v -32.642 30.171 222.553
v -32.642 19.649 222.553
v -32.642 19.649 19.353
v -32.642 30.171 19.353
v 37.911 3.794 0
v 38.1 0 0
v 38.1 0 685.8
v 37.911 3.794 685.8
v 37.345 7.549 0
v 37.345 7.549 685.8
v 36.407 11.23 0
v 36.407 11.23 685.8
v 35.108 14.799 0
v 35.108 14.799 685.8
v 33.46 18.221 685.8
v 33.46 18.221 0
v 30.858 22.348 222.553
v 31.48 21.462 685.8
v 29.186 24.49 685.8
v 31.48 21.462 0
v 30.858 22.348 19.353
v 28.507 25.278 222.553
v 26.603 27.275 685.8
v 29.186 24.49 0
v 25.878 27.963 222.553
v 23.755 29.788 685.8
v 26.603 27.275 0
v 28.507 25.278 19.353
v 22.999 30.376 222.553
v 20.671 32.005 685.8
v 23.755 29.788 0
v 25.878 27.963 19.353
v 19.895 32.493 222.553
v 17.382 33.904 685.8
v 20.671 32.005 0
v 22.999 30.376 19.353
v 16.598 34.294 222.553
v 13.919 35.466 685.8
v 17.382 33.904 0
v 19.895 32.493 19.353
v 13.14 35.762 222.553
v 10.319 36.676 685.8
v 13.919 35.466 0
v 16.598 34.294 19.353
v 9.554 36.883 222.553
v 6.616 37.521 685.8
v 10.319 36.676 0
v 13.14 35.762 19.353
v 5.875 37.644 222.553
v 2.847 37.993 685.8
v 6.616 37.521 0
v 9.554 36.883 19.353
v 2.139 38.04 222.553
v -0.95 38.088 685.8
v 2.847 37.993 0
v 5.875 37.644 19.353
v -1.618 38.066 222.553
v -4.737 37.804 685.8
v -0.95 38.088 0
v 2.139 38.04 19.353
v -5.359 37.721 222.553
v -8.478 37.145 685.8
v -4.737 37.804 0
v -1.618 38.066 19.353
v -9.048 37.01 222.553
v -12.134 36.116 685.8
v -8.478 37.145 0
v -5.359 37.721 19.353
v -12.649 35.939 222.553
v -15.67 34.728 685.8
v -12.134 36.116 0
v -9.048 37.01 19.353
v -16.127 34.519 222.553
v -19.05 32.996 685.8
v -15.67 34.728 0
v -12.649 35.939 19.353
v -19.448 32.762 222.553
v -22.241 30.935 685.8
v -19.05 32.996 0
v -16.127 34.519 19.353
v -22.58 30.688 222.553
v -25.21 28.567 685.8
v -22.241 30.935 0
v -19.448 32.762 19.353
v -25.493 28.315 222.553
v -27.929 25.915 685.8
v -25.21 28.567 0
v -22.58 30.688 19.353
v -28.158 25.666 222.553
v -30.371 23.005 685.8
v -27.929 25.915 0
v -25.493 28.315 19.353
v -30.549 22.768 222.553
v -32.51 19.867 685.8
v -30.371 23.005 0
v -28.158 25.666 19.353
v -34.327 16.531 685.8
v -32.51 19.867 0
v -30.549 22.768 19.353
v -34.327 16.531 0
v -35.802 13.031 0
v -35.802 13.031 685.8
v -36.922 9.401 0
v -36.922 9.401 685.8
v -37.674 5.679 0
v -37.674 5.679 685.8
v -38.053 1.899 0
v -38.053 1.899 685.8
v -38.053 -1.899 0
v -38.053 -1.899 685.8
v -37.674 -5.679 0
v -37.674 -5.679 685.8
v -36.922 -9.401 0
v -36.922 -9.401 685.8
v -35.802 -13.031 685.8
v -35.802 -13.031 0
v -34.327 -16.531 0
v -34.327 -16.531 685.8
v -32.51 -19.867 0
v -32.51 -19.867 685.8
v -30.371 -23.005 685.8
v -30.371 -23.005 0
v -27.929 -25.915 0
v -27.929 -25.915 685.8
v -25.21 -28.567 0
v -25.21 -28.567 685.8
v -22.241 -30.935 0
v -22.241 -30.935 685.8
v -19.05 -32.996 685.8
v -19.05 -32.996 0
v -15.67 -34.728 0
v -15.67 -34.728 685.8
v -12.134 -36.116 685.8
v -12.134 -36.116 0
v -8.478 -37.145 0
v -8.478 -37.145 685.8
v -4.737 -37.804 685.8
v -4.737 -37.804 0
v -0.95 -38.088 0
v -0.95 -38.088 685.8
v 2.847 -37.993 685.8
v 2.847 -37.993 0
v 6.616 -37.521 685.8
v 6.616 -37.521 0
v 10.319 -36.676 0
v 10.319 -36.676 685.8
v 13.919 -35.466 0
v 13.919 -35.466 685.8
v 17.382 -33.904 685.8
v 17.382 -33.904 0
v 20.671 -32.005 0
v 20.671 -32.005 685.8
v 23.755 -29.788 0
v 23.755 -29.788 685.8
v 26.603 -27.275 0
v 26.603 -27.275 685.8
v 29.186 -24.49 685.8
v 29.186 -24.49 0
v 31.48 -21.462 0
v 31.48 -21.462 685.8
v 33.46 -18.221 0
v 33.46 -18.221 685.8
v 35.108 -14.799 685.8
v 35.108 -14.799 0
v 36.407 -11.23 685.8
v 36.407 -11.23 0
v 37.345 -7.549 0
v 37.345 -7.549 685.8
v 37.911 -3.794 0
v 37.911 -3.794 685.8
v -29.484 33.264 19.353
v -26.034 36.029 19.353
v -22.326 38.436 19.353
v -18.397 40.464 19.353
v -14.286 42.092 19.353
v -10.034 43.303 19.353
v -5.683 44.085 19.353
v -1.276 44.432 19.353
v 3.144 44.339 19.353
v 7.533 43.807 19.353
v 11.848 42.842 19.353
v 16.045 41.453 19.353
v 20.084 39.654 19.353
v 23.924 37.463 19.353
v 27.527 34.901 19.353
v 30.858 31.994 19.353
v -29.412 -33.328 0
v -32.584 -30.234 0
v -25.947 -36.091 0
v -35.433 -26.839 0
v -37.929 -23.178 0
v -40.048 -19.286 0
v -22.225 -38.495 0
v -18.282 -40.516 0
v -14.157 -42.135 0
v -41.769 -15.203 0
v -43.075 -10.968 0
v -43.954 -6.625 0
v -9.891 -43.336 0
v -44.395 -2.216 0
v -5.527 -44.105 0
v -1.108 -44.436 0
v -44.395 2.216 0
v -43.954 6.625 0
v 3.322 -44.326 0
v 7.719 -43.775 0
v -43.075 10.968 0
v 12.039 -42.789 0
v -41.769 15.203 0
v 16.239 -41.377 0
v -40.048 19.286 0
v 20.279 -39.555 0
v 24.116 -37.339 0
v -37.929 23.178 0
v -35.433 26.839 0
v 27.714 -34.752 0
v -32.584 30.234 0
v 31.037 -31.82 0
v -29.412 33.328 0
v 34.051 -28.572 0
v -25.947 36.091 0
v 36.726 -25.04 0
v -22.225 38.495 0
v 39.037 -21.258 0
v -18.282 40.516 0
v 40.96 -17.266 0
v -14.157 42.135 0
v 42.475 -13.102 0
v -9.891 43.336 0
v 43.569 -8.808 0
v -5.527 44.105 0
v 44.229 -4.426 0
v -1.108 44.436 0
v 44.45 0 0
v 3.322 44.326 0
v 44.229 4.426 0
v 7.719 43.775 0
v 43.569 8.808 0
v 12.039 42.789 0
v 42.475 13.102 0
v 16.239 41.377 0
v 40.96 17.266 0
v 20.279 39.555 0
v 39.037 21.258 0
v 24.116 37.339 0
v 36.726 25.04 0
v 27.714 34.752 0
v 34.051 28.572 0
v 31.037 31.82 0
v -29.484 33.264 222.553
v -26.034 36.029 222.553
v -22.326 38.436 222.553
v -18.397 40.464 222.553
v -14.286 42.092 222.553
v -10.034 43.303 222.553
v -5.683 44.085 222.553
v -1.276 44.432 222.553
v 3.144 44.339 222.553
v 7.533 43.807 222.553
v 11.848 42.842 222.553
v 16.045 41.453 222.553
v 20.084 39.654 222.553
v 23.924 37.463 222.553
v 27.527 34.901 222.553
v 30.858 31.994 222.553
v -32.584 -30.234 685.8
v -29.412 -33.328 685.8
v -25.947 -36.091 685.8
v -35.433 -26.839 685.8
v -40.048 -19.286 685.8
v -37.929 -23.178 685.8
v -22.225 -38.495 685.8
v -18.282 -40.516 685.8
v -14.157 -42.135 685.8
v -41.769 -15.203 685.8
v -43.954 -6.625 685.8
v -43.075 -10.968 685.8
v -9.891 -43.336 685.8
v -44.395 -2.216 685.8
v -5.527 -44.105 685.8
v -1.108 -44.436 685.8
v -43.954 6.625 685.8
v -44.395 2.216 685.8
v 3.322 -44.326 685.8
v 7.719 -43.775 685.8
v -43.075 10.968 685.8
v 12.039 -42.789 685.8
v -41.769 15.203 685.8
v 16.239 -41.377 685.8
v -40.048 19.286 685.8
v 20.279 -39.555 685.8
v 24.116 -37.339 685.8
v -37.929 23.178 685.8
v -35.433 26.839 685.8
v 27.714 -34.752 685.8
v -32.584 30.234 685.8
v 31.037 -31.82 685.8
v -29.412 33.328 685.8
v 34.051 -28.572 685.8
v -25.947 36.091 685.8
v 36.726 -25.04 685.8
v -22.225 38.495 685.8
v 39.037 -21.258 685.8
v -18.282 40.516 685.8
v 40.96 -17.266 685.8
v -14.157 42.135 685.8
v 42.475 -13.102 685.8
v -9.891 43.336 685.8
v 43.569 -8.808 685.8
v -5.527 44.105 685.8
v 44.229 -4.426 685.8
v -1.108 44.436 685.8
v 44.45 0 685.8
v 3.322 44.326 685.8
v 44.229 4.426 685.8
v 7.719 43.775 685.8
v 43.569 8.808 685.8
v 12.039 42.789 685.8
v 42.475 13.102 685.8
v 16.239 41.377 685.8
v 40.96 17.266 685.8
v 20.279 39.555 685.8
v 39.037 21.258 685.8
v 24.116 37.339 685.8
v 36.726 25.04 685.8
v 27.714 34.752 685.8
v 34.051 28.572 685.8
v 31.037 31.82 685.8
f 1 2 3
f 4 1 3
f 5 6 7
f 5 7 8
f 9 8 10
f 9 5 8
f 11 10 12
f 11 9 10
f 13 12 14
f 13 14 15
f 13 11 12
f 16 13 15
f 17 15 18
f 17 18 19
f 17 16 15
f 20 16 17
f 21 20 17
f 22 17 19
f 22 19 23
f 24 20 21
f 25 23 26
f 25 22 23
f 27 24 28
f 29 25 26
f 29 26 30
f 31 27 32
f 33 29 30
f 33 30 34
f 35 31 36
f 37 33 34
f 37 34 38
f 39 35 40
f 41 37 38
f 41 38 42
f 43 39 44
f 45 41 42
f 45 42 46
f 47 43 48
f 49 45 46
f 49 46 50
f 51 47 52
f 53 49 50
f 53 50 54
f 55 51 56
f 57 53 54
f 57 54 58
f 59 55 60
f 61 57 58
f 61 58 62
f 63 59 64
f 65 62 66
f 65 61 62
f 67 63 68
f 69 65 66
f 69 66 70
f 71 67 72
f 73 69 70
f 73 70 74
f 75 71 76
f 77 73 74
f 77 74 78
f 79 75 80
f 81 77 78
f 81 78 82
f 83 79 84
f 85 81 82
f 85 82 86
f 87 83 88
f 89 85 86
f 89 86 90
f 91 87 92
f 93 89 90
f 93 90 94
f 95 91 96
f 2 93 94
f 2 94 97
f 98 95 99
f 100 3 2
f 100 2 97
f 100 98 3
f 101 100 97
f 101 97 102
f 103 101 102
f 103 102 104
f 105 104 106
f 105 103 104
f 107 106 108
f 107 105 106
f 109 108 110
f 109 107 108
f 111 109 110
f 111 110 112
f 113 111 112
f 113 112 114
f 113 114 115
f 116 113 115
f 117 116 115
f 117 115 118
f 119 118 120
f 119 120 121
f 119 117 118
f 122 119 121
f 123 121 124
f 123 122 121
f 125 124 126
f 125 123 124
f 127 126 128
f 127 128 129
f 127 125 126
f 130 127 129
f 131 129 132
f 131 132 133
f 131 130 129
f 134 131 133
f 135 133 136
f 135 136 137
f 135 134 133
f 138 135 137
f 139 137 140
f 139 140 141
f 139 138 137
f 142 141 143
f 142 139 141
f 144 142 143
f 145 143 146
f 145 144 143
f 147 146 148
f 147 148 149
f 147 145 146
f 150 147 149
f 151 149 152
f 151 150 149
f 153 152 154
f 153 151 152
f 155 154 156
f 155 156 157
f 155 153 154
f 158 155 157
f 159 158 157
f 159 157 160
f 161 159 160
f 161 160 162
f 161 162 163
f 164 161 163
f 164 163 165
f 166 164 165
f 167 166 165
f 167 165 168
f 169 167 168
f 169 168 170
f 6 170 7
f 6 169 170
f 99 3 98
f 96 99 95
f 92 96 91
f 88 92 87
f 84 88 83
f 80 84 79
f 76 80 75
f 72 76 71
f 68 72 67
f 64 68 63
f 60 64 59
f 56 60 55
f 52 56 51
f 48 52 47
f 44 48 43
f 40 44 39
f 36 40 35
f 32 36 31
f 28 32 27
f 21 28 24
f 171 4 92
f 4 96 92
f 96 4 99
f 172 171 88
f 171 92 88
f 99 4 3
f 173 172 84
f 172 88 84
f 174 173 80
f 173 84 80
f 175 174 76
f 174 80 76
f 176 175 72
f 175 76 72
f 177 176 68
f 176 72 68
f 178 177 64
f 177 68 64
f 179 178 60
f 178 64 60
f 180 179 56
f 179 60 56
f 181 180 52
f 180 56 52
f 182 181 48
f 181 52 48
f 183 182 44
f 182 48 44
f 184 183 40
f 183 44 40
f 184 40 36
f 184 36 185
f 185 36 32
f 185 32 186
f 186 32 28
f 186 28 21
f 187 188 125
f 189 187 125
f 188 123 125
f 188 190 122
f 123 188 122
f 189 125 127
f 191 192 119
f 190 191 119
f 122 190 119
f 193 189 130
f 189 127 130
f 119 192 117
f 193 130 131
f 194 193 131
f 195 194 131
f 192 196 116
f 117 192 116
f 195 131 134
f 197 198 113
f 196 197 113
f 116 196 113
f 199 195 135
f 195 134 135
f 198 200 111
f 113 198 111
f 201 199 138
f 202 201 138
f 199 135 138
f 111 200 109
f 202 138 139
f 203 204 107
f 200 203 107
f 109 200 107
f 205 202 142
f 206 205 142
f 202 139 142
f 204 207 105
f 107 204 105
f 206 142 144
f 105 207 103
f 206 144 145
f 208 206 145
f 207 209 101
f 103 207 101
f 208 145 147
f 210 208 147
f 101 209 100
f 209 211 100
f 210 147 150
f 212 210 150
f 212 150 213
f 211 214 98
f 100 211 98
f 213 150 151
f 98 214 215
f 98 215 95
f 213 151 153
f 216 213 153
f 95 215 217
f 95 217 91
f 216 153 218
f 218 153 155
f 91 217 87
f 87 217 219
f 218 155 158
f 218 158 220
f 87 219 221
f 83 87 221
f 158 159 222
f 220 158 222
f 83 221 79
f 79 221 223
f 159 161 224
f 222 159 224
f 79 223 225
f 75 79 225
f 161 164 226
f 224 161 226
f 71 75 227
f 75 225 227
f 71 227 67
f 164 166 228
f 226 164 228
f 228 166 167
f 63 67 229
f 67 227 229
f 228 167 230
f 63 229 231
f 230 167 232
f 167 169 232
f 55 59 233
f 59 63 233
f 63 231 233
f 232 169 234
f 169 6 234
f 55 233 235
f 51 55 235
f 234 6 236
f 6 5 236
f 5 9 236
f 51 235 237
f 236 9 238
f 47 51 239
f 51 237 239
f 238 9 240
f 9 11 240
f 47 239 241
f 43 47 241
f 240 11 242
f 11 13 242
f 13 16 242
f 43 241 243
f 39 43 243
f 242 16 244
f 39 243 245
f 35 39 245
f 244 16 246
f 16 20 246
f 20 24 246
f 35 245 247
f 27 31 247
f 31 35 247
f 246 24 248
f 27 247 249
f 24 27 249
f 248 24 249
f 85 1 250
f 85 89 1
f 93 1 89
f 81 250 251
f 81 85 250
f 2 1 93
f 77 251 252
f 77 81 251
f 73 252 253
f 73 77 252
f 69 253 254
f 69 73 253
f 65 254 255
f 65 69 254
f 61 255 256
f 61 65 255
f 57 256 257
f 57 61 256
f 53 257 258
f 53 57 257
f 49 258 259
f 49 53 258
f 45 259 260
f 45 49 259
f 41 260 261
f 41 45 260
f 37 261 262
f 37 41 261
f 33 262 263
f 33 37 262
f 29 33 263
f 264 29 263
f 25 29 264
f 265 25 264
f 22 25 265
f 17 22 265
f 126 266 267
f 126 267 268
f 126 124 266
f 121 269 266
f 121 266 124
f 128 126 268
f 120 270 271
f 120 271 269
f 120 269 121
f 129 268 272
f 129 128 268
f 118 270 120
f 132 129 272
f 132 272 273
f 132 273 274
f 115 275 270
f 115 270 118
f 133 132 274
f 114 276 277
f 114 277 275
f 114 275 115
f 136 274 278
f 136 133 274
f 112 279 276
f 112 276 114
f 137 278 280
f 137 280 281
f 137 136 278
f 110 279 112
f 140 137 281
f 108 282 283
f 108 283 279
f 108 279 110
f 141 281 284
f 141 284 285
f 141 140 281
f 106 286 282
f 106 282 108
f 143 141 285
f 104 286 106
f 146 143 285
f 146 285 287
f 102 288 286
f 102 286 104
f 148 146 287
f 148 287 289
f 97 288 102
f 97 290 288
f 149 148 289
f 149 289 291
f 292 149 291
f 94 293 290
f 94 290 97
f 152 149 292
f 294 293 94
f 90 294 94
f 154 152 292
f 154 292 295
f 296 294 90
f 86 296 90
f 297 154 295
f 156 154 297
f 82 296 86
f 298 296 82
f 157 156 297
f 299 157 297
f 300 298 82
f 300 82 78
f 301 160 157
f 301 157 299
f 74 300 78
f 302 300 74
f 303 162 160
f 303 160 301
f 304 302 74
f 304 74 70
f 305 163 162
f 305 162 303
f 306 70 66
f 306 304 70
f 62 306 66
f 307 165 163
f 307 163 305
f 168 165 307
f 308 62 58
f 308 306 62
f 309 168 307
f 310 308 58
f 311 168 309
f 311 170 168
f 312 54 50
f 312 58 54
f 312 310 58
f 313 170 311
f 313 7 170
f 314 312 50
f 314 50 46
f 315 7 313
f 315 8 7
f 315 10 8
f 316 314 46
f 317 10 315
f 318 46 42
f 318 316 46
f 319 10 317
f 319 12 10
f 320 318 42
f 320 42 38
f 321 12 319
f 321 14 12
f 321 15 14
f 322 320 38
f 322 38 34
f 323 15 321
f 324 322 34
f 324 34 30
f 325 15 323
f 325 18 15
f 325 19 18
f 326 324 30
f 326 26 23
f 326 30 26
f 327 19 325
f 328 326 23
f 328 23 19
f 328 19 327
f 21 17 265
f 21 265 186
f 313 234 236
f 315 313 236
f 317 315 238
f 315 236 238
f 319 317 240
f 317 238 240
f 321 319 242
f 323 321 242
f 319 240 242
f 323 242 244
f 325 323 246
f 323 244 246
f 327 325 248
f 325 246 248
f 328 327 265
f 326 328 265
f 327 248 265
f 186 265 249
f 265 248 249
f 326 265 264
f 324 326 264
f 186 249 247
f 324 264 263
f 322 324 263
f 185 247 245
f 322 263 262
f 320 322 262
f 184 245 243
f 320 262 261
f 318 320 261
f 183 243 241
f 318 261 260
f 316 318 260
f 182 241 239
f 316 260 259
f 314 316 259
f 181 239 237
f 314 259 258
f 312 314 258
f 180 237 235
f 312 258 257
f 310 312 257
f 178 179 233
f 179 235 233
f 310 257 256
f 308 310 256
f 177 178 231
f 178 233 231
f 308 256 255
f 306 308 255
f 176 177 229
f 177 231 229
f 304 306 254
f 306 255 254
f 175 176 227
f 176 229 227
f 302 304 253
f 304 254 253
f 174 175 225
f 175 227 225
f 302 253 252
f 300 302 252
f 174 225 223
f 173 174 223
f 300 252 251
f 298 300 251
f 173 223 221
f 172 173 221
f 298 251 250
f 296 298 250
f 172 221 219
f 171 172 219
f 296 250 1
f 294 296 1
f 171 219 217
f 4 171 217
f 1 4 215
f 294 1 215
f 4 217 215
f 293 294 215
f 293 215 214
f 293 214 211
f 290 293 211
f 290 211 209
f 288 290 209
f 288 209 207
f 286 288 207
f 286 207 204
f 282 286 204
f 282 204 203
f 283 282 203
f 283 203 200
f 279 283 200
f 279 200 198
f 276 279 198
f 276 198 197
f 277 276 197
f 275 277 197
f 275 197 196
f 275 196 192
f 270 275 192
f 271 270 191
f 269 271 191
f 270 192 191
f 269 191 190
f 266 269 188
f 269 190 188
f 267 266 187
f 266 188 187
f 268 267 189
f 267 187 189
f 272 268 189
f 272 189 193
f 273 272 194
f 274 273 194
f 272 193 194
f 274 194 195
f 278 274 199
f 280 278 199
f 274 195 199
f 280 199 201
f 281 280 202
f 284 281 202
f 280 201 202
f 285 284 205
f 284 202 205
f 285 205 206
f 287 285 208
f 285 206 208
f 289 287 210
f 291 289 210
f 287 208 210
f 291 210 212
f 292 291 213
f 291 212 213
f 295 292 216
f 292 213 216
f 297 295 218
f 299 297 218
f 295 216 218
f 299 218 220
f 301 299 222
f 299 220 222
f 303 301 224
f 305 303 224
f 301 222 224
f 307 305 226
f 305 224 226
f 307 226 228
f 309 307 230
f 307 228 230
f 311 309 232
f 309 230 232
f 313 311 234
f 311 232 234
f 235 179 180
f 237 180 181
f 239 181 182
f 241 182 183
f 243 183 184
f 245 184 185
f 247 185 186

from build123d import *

# Parameters (mm, degrees)
SKETCH3_R           = 44.45
SKETCH3_R_2         = 38.1
BOSS_EXTRUDE3_DEPTH = 685.8
SKETCH4_W           = 63.5
SKETCH4_H           = 203.2
CUT_EXTRUDE2_DEPTH  = 685.8


with BuildPart() as part:
    # Sketch3 → Boss-Extrude3 (new body)
    with BuildSketch(Plane.XY):
        Circle(SKETCH3_R)
        Circle(SKETCH3_R_2, mode=Mode.SUBTRACT)
    extrude(amount=BOSS_EXTRUDE3_DEPTH)

    # Sketch4 → Cut-Extrude2 (cut)
    with BuildSketch(Plane(origin=(0, 0, 0), x_dir=(1, 0, 0), z_dir=(0, 1, 0))):
        with Locations((-0.892426947, -120.953055133)):
            Rectangle(SKETCH4_W, SKETCH4_H)
    extrude(amount=CUT_EXTRUDE2_DEPTH, mode=Mode.SUBTRACT)


solid = part.part
